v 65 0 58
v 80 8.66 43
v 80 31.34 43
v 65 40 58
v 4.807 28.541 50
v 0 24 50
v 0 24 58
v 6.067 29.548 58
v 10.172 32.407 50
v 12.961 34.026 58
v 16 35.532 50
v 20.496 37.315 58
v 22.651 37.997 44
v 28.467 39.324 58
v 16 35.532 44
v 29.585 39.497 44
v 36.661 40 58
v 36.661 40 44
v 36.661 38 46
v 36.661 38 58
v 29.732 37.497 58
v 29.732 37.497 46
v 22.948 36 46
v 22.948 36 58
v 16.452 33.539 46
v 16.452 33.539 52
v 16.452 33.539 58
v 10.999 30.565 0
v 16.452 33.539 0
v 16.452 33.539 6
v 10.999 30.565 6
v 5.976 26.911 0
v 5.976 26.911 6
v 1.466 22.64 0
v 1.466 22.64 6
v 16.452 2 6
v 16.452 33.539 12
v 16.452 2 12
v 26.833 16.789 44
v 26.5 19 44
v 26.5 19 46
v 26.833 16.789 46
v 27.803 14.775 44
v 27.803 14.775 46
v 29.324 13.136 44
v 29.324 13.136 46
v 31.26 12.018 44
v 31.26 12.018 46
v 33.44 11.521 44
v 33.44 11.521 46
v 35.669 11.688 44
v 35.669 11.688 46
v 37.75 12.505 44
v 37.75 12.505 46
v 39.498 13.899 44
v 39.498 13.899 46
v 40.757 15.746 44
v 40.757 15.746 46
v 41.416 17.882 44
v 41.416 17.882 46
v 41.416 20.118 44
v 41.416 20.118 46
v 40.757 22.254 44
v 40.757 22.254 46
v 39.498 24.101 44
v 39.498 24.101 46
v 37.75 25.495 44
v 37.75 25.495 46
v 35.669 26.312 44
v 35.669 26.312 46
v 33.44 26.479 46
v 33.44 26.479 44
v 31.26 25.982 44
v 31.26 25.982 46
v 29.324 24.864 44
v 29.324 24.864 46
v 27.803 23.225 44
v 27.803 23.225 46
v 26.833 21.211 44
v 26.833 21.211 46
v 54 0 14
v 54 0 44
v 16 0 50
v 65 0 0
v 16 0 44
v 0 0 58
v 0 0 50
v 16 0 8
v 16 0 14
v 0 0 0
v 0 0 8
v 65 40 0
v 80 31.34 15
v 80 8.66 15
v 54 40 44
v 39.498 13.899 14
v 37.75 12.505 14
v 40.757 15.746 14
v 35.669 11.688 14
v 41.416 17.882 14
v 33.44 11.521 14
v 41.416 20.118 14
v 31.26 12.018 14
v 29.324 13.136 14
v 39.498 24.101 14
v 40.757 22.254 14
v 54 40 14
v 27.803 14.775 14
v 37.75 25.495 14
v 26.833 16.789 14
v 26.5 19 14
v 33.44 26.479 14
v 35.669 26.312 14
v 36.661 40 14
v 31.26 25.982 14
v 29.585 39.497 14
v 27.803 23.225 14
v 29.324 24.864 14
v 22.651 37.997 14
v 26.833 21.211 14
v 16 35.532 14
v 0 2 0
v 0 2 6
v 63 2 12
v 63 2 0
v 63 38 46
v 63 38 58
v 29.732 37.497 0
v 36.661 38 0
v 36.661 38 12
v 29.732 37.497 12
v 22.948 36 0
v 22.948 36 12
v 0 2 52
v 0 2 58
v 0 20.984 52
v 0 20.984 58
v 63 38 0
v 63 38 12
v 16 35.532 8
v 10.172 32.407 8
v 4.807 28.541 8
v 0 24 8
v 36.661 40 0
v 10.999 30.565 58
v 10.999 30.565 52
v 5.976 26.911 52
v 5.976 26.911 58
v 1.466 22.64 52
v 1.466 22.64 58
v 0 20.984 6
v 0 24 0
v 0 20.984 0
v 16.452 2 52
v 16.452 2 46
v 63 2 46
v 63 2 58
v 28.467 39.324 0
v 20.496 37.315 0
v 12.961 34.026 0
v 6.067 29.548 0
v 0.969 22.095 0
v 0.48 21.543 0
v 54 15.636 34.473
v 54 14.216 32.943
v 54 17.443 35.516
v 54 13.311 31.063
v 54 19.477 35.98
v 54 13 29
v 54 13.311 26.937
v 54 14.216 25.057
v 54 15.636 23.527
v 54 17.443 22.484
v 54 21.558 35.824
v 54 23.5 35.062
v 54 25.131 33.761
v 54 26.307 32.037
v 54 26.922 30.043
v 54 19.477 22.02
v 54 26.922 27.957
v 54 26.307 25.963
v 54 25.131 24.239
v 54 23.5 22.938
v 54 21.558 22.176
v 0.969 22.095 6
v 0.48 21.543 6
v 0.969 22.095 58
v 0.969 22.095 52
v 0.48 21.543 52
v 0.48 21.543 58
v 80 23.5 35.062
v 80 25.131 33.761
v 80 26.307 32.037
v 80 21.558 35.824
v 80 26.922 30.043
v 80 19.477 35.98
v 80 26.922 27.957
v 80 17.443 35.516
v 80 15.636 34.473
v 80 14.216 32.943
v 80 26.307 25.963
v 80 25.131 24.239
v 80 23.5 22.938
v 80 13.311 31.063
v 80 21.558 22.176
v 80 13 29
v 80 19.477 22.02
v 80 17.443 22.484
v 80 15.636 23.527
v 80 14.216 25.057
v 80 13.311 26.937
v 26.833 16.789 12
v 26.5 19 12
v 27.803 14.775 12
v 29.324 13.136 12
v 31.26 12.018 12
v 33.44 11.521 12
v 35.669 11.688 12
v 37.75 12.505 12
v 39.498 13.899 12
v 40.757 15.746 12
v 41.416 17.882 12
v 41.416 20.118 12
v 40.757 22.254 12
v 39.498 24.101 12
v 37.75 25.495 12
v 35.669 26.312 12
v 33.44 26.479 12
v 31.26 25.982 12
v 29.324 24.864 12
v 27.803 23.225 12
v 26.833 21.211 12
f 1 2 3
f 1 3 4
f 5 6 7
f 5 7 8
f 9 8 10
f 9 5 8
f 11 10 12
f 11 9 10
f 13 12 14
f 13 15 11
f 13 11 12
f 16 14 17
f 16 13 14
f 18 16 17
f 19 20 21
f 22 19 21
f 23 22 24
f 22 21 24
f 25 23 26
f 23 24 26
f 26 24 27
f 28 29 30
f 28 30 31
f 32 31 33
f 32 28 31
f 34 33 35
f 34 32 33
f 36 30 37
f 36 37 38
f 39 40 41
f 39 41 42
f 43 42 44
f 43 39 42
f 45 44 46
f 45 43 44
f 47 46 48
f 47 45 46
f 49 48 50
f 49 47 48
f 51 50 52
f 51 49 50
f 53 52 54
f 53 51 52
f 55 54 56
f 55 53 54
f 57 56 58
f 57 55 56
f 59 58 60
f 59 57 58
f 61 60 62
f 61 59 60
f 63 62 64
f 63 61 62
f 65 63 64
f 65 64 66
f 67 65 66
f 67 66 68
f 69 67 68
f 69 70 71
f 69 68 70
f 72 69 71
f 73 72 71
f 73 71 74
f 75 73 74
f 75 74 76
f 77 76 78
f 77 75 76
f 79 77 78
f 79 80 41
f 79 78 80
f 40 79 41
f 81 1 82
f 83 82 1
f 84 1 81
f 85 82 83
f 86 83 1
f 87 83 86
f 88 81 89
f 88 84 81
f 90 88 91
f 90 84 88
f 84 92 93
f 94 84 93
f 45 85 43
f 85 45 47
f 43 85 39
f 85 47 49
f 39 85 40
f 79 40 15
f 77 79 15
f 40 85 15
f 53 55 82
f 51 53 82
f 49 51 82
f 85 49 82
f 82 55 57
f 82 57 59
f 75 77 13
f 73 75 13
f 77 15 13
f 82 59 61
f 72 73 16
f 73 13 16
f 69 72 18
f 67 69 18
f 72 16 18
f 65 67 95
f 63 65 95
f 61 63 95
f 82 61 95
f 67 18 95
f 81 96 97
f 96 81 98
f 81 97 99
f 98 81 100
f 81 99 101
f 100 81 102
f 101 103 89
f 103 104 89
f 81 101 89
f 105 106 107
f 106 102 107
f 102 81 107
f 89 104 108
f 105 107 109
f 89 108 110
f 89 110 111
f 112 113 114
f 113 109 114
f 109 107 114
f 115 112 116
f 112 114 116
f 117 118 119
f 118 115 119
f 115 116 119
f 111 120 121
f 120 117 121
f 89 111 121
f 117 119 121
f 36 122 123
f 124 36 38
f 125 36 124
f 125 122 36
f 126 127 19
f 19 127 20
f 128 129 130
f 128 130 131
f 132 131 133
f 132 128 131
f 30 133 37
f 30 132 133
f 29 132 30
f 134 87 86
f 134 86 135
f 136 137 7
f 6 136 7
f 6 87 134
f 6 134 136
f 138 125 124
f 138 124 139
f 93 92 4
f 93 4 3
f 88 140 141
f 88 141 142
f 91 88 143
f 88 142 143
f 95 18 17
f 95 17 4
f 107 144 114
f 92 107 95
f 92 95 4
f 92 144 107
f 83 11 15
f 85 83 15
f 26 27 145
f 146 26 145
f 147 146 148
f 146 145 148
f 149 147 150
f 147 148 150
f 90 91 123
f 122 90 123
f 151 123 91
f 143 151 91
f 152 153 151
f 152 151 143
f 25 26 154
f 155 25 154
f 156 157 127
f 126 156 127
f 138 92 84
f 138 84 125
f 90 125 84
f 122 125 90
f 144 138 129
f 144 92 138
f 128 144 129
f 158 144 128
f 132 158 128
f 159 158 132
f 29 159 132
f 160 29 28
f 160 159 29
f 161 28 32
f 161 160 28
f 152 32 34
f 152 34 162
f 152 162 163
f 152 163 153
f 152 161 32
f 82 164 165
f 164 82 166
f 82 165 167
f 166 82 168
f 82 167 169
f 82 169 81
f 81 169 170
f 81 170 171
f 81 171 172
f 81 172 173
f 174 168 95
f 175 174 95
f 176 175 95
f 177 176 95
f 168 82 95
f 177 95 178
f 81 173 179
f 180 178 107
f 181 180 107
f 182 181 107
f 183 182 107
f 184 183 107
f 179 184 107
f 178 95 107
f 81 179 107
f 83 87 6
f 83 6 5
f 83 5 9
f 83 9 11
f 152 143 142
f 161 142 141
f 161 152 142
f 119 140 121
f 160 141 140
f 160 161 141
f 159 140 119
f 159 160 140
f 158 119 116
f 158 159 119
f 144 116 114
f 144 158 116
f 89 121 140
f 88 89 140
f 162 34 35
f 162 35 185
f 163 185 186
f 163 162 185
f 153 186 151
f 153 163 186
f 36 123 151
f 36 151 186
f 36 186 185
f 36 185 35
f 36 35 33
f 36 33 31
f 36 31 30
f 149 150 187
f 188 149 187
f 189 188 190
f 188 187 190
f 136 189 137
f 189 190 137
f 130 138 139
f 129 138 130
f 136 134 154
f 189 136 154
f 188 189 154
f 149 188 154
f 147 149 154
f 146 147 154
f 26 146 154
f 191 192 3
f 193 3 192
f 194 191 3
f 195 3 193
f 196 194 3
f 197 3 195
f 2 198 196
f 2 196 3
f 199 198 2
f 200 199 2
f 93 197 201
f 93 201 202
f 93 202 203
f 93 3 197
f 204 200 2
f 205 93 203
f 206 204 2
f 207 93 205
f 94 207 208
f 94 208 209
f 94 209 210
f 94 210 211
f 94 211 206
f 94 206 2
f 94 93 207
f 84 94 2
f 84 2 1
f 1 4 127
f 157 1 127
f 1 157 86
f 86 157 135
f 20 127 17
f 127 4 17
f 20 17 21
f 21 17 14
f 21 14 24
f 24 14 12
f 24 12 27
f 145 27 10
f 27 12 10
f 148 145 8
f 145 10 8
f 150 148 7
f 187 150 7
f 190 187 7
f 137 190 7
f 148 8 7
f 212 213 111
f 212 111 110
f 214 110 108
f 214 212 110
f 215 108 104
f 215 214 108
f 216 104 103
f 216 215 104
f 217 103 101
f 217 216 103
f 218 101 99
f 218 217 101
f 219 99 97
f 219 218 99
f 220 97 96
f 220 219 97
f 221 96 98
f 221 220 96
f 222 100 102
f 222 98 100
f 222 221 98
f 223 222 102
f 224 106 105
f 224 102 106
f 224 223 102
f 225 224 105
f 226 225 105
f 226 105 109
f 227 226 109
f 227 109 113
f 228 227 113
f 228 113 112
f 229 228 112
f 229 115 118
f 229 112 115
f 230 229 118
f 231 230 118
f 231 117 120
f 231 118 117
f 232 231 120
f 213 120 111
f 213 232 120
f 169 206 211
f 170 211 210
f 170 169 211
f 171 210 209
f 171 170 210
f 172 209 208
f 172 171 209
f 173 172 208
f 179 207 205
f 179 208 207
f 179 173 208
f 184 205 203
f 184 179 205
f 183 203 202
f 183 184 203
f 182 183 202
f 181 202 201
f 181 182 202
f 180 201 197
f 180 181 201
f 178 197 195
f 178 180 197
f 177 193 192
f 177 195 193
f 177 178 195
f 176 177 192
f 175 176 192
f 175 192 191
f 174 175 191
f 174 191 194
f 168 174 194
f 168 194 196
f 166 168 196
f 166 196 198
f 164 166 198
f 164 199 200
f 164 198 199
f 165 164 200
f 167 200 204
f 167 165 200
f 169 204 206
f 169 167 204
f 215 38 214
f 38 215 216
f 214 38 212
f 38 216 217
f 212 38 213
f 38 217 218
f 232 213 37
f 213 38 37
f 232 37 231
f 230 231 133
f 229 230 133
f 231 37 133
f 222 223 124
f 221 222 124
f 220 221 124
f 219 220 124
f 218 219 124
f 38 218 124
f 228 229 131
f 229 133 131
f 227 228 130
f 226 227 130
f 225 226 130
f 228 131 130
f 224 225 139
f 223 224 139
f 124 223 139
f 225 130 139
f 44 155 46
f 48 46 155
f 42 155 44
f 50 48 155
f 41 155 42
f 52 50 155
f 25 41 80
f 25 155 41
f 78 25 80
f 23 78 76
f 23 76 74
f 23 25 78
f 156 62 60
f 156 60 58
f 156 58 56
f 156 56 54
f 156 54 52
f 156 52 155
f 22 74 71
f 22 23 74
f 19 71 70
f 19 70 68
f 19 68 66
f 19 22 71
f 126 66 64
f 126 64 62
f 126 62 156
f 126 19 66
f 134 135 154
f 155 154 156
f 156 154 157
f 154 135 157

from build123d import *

# Parameters (mm, degrees)
SKETCH1_R               = 7.5
BOSS_EXTRUDE1_DEPTH     = 58
SKETCH2_W               = 17.33939444
SKETCH2_H               = 30
CUT_EXTRUDE1_DEPTH      = 107.60206377
CUT_EXTRUDE5_DEPTH      = 107.60206377
CUT_EXTRUDE5_DEPTH_BACK = 107.60206377
SKETCH3_R               = 7
CUT_EXTRUDE8_DEPTH      = 6
CUT_EXTRUDE9_DEPTH      = 12


with BuildPart() as part:
    # Sketch1 → Boss-Extrude1 (new body)
    with BuildSketch(Plane.XY):
        with BuildLine():
            Line((0, 0), (0, 24))
            ThreePointArc((0, 24), (16.66060556, 35.82575695), (36.66060556, 40))
            Line((36.66060556, 40), (65, 40))
            Line((65, 40), (80, 31.339745962))
            Line((80, 31.339745962), (80, 8.660254038))
            Line((80, 8.660254038), (65, 0))
            Line((65, 0), (0, 0))
        make_face()
        with Locations(Location((34, 19, 0), (0, 0, 180))):
            Circle(SKETCH1_R, mode=Mode.SUBTRACT)
    extrude(amount=BOSS_EXTRUDE1_DEPTH)

    # Sketch2 → Cut-Extrude1 (cut, through all)
    with BuildSketch(Plane(origin=(0, 40, 0), x_dir=(1, 0, 0), z_dir=(0, 1, 0))):
        Polygon((16, -8), (0, -8), (0, -50), (16, -50), (16, -44), (36.66060556, -44), (36.66060556, -14), (16, -14), align=None)
        with Locations((45.33030278, -29)):
            Rectangle(SKETCH2_W, SKETCH2_H)
        Polygon((80, 0), (65, 0), (80, -15), align=None)
        Polygon((80, -58), (80, -43), (65, -58), align=None)
    extrude(amount=-CUT_EXTRUDE1_DEPTH, mode=Mode.SUBTRACT)

    # Sketch3 → Cut-Extrude5 (cut, two sides: drawn at the far end of the back side and taken through both)
    with BuildSketch(Plane(origin=(80, 0, 0), x_dir=(0, 0, -1), z_dir=(1, 0, 0)).offset(-CUT_EXTRUDE5_DEPTH_BACK)):
        with Locations(Location((-29, 20, 0), (0, 0, 270))):
            Circle(SKETCH3_R)
    extrude(amount=CUT_EXTRUDE5_DEPTH + CUT_EXTRUDE5_DEPTH_BACK, mode=Mode.SUBTRACT)

    # Sketch7 → Cut-Extrude8 (cut)
    with BuildSketch(Plane.XY.offset(58)):
        with BuildLine():
            Line((16.452013389, 2), (16.452013389, 33.538635744))
            ThreePointArc((16.452013389, 33.538635744), (8.428320966, 28.819300697), (1.466424222, 22.64))
            ThreePointArc((1.466424222, 22.64), (0.7236706, 21.820381922), (0, 20.98386677))
            Line((0, 20.98386677), (0, 2))
            Line((0, 2), (16.452013389, 2))
        make_face()
    cut_extrude8 = extrude(amount=-CUT_EXTRUDE8_DEPTH, mode=Mode.SUBTRACT)

    # Sketch7<3> → Cut-Extrude9 (cut)
    with BuildSketch(Plane.XY.offset(58)):
        with BuildLine():
            ThreePointArc((36.66060556, 38), (26.3130096, 36.871390612), (16.452013389, 33.538635744))
            Line((16.452013389, 33.538635744), (16.452013389, 2))
            Line((16.452013389, 2), (63, 2))
            Line((63, 2), (63, 38))
            Line((63, 38), (36.66060556, 38))
        make_face()
    cut_extrude9 = extrude(amount=-CUT_EXTRUDE9_DEPTH, mode=Mode.SUBTRACT)

    # Mirror3: Cut-Extrude8, Cut-Extrude9 across plane
    add(cut_extrude8.mirror(Plane.XY.offset(29)), mode=Mode.SUBTRACT)
    add(cut_extrude9.mirror(Plane.XY.offset(29)), mode=Mode.SUBTRACT)


solid = part.part
